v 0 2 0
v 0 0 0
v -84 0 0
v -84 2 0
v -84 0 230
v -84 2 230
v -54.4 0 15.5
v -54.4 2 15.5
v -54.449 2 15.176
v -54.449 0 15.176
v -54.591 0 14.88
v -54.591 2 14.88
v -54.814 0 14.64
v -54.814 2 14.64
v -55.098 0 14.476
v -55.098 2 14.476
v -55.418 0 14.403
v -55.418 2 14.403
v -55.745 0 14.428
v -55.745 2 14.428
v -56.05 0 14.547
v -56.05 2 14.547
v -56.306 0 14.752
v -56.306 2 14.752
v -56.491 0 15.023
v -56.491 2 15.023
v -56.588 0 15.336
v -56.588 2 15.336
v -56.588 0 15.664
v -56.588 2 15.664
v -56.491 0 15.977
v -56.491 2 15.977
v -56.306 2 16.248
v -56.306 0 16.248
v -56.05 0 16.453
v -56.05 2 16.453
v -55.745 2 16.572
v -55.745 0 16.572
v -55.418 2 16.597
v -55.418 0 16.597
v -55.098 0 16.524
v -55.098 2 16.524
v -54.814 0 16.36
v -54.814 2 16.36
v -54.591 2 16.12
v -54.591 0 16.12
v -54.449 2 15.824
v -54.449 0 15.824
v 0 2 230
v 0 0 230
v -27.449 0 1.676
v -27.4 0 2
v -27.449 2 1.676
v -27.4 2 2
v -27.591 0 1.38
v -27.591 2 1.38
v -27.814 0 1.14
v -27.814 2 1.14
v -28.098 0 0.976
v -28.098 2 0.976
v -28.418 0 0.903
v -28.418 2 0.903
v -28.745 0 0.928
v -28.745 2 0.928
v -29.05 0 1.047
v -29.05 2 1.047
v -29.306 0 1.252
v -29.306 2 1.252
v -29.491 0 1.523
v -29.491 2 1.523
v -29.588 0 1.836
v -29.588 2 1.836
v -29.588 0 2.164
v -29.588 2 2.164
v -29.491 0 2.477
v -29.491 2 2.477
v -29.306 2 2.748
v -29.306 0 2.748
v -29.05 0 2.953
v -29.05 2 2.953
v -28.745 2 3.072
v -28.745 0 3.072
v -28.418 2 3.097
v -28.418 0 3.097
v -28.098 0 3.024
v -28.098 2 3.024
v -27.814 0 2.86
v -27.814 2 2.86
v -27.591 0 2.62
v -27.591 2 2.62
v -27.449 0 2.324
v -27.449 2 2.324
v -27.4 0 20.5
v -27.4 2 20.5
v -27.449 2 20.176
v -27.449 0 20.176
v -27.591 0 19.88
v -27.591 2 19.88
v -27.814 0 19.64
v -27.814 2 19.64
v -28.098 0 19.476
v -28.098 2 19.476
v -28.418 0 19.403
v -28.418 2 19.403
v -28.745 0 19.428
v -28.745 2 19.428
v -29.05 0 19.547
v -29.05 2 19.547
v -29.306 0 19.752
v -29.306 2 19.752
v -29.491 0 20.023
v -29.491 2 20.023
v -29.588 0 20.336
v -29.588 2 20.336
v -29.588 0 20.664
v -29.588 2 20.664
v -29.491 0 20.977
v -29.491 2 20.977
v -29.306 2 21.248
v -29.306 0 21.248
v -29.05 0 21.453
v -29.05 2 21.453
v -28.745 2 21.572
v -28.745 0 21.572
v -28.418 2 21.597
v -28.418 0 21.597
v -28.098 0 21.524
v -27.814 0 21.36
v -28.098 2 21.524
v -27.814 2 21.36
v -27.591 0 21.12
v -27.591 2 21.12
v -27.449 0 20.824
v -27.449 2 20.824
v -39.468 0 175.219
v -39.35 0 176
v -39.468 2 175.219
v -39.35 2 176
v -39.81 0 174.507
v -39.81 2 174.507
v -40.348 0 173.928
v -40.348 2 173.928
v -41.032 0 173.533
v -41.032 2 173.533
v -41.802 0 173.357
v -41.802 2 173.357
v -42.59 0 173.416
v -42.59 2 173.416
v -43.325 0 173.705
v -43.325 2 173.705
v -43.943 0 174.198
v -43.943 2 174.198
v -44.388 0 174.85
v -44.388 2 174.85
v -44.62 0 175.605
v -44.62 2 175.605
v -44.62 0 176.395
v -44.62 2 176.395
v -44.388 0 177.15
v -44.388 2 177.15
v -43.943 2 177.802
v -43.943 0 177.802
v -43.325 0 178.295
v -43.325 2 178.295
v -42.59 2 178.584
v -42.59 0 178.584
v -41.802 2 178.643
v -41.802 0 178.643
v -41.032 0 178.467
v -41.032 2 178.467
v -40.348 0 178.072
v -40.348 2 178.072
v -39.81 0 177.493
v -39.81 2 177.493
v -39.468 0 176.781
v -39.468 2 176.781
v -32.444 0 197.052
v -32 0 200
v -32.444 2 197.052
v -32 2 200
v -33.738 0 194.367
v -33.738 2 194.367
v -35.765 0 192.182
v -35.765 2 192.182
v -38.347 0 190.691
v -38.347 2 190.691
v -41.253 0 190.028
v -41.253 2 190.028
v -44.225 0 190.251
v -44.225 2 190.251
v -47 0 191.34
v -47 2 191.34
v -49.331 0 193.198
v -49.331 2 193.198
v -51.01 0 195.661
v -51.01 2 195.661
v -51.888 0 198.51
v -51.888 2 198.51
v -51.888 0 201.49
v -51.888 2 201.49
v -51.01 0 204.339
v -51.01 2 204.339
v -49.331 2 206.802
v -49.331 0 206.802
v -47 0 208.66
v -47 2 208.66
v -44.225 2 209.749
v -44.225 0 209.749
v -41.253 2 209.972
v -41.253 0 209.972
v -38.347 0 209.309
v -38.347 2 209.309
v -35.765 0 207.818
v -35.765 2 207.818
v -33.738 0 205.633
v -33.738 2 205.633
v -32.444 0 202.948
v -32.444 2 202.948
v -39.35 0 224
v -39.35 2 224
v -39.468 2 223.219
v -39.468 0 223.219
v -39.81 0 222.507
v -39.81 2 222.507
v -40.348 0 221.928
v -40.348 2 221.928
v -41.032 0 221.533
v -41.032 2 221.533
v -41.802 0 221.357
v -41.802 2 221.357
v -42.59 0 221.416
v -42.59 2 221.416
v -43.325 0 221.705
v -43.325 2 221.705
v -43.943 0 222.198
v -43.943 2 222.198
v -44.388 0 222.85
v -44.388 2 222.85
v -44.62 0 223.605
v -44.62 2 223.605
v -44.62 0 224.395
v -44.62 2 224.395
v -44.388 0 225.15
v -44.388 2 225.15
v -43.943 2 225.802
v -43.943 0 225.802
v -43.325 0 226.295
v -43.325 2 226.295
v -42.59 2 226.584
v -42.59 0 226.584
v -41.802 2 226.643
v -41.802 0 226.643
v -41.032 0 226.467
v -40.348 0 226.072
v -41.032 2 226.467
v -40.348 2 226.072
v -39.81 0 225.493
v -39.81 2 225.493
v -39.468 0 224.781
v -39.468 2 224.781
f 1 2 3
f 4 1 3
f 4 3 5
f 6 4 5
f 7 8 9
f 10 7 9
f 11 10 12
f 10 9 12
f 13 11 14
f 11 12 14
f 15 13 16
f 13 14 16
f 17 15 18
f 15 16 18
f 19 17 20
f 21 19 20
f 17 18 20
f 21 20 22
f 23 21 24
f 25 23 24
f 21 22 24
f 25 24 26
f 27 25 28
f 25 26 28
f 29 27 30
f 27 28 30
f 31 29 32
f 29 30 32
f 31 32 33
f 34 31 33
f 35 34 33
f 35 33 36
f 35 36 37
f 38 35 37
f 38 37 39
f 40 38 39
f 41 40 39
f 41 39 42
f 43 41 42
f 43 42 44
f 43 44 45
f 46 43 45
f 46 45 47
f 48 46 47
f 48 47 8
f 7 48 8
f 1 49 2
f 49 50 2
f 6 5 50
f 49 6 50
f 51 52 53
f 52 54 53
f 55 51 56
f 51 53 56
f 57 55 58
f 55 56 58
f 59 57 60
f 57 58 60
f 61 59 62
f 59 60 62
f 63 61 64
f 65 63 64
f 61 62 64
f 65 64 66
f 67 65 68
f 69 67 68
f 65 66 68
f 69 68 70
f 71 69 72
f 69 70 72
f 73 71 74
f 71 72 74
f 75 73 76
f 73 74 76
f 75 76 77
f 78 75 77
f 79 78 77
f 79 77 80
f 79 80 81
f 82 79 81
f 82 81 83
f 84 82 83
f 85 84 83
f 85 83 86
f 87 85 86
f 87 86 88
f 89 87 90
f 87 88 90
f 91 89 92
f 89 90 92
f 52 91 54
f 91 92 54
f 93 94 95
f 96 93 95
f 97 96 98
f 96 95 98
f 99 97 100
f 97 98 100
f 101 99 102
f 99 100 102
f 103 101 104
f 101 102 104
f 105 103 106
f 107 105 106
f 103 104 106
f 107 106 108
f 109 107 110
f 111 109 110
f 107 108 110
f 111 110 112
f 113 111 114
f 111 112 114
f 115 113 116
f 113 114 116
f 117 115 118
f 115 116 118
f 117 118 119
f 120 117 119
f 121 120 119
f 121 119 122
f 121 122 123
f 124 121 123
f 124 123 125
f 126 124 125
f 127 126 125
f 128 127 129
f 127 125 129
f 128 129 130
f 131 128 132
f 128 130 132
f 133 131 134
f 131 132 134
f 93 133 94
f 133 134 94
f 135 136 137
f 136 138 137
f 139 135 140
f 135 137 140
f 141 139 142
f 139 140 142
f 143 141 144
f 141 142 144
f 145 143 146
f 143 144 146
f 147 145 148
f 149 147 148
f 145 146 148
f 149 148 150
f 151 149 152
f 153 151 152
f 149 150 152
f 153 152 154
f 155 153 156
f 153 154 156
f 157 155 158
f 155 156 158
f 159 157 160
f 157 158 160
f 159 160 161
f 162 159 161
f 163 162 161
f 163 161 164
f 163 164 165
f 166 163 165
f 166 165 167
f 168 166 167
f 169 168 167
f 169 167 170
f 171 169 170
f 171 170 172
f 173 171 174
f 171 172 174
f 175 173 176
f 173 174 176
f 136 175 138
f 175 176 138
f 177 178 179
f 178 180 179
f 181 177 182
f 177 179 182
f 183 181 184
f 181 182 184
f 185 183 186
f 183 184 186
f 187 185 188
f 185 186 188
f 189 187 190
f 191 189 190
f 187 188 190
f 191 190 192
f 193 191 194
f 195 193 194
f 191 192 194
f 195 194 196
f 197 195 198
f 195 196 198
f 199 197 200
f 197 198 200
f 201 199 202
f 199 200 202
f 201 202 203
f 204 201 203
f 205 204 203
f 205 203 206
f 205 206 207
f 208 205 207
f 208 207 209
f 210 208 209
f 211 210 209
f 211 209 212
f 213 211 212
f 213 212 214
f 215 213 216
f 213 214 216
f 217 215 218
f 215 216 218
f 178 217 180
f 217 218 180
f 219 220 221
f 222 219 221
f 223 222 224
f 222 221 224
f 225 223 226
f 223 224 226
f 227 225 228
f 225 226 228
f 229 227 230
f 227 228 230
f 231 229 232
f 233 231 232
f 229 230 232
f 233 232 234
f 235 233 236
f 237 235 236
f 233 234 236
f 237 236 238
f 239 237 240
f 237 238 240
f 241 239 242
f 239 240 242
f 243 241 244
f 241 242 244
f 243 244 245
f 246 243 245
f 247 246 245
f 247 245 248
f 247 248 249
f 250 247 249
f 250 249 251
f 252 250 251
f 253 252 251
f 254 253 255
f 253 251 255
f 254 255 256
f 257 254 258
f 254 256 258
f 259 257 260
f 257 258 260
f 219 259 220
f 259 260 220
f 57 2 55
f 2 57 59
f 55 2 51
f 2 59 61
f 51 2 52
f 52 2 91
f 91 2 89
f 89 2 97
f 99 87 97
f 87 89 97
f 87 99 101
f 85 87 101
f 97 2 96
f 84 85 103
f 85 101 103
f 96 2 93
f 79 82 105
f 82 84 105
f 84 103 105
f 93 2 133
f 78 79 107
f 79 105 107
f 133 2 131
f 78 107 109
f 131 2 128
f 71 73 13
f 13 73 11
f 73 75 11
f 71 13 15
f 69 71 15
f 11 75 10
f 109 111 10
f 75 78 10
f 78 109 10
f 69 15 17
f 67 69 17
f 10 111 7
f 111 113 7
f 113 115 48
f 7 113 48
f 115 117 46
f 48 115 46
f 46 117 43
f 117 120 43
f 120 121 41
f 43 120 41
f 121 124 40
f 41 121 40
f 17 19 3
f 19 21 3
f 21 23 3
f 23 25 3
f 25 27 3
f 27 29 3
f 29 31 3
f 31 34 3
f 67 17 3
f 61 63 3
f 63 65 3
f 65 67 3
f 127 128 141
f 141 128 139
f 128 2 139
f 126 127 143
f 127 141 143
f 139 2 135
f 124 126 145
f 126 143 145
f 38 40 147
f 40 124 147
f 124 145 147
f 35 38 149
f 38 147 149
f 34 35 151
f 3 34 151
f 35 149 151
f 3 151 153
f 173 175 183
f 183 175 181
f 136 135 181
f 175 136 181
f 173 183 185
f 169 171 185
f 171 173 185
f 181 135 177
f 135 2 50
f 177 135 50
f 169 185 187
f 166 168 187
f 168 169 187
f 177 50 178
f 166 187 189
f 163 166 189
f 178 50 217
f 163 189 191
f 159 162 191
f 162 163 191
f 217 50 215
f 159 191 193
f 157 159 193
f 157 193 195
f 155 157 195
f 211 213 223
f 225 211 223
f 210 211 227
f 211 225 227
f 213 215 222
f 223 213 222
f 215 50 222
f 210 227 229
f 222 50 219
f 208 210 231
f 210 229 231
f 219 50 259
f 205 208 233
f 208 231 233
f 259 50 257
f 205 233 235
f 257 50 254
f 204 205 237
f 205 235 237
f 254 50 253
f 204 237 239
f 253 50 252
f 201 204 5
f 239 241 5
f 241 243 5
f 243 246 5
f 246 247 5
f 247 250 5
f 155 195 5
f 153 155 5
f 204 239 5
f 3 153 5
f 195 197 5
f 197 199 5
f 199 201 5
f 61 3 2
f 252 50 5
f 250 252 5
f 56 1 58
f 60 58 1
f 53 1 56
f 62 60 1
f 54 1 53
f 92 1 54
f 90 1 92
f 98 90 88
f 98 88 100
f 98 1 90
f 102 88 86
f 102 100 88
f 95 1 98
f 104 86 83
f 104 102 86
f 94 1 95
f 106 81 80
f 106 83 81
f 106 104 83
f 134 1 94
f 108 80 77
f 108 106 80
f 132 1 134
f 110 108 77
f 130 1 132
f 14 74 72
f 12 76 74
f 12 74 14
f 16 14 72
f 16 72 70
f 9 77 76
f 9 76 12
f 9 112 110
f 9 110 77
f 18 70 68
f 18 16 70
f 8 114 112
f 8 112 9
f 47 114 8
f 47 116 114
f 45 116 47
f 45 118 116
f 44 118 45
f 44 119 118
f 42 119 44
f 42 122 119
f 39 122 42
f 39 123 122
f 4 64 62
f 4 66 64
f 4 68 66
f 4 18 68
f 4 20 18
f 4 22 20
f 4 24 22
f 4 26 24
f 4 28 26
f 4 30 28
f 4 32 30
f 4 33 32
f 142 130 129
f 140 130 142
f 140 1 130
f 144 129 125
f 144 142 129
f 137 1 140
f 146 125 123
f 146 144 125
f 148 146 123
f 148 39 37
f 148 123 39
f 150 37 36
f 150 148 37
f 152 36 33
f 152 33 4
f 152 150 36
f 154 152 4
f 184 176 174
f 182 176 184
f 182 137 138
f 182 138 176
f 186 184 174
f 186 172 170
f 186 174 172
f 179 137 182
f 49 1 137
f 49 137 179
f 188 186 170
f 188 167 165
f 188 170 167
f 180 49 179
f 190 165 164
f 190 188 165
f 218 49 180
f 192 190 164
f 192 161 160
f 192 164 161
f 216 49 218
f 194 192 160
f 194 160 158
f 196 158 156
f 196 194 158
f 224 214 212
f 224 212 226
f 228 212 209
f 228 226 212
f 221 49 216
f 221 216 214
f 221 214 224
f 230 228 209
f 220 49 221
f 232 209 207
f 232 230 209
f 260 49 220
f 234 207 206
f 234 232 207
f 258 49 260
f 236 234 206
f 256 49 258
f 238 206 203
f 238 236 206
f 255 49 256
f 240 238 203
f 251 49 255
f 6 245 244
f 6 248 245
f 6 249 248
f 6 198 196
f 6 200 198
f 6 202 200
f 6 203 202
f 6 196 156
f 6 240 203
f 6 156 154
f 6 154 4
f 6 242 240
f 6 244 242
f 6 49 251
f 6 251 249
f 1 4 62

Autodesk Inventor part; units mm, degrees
ref_plane "YZ Plane" through (0, 0, 0) normal (1, 0, 0) x (0, 1, 0)
ref_plane "XZ Plane" through (0, 0, 0) normal (0, 1, 0) x (-1, 0, 0)
ref_plane "XY Plane" through (0, 0, 0) normal (0, 0, 1) x (1, 0, 0)
sketch "スケッチ1" plane through (0, 0, 0) normal (0, 1, 0) x (-1, 0, 0)
  line L0 (0, 0) -> (84, 0)
  line L1 (84, 0) -> (84, 230)
  line L2 (84, 230) -> (0, 230)
  line L3 (0, 230) -> (0, 0)
  dimension "d0" = 84
  dimension "d1" = 230
extrude "押し出し1" add sketch "スケッチ1" along normal blind 2
sketch "スケッチ2" plane through (0, 2, 0) normal (0, 1, 0) x (1, 0, 0)
  line L0 (0, 0) -> (-84, 0) projected
  line L1 (0, -230) -> (0, 0) projected
  circle A0 centre (-42, -224) radius 2.65
  line L2 (-84, -230) -> (0, -230) projected
  circle A1 centre (-42, -176) radius 2.65
  circle A2 centre (-28.5, -2) radius 1.1
  circle A3 centre (-28.5, -20.5) radius 1.1
  circle A4 centre (-55.5, -15.5) radius 1.1
  circle A5 centre (-42, -200) radius 10
  dimension "d9" = 5.3
  dimension "d10" = 6
  dimension "d11" = 42
  dimension "d12" = 5.3
  dimension "d13" = 48
  dimension "d16" = 2.2
  dimension "d17" = 2.2
  dimension "d18" = 2.2
  dimension "d19" = 228
  dimension "d20" = 209.5
  dimension "d21" = 214.5
  dimension "d22" = 55.5
  dimension "d23" = 28.5
  dimension "d24" = 28.5
  dimension "d27" = 20
  dimension "d28" = 24
extrude "押し出し5" cut sketch "スケッチ2" against normal blind 2
properties part number "Force_Arm_board"
